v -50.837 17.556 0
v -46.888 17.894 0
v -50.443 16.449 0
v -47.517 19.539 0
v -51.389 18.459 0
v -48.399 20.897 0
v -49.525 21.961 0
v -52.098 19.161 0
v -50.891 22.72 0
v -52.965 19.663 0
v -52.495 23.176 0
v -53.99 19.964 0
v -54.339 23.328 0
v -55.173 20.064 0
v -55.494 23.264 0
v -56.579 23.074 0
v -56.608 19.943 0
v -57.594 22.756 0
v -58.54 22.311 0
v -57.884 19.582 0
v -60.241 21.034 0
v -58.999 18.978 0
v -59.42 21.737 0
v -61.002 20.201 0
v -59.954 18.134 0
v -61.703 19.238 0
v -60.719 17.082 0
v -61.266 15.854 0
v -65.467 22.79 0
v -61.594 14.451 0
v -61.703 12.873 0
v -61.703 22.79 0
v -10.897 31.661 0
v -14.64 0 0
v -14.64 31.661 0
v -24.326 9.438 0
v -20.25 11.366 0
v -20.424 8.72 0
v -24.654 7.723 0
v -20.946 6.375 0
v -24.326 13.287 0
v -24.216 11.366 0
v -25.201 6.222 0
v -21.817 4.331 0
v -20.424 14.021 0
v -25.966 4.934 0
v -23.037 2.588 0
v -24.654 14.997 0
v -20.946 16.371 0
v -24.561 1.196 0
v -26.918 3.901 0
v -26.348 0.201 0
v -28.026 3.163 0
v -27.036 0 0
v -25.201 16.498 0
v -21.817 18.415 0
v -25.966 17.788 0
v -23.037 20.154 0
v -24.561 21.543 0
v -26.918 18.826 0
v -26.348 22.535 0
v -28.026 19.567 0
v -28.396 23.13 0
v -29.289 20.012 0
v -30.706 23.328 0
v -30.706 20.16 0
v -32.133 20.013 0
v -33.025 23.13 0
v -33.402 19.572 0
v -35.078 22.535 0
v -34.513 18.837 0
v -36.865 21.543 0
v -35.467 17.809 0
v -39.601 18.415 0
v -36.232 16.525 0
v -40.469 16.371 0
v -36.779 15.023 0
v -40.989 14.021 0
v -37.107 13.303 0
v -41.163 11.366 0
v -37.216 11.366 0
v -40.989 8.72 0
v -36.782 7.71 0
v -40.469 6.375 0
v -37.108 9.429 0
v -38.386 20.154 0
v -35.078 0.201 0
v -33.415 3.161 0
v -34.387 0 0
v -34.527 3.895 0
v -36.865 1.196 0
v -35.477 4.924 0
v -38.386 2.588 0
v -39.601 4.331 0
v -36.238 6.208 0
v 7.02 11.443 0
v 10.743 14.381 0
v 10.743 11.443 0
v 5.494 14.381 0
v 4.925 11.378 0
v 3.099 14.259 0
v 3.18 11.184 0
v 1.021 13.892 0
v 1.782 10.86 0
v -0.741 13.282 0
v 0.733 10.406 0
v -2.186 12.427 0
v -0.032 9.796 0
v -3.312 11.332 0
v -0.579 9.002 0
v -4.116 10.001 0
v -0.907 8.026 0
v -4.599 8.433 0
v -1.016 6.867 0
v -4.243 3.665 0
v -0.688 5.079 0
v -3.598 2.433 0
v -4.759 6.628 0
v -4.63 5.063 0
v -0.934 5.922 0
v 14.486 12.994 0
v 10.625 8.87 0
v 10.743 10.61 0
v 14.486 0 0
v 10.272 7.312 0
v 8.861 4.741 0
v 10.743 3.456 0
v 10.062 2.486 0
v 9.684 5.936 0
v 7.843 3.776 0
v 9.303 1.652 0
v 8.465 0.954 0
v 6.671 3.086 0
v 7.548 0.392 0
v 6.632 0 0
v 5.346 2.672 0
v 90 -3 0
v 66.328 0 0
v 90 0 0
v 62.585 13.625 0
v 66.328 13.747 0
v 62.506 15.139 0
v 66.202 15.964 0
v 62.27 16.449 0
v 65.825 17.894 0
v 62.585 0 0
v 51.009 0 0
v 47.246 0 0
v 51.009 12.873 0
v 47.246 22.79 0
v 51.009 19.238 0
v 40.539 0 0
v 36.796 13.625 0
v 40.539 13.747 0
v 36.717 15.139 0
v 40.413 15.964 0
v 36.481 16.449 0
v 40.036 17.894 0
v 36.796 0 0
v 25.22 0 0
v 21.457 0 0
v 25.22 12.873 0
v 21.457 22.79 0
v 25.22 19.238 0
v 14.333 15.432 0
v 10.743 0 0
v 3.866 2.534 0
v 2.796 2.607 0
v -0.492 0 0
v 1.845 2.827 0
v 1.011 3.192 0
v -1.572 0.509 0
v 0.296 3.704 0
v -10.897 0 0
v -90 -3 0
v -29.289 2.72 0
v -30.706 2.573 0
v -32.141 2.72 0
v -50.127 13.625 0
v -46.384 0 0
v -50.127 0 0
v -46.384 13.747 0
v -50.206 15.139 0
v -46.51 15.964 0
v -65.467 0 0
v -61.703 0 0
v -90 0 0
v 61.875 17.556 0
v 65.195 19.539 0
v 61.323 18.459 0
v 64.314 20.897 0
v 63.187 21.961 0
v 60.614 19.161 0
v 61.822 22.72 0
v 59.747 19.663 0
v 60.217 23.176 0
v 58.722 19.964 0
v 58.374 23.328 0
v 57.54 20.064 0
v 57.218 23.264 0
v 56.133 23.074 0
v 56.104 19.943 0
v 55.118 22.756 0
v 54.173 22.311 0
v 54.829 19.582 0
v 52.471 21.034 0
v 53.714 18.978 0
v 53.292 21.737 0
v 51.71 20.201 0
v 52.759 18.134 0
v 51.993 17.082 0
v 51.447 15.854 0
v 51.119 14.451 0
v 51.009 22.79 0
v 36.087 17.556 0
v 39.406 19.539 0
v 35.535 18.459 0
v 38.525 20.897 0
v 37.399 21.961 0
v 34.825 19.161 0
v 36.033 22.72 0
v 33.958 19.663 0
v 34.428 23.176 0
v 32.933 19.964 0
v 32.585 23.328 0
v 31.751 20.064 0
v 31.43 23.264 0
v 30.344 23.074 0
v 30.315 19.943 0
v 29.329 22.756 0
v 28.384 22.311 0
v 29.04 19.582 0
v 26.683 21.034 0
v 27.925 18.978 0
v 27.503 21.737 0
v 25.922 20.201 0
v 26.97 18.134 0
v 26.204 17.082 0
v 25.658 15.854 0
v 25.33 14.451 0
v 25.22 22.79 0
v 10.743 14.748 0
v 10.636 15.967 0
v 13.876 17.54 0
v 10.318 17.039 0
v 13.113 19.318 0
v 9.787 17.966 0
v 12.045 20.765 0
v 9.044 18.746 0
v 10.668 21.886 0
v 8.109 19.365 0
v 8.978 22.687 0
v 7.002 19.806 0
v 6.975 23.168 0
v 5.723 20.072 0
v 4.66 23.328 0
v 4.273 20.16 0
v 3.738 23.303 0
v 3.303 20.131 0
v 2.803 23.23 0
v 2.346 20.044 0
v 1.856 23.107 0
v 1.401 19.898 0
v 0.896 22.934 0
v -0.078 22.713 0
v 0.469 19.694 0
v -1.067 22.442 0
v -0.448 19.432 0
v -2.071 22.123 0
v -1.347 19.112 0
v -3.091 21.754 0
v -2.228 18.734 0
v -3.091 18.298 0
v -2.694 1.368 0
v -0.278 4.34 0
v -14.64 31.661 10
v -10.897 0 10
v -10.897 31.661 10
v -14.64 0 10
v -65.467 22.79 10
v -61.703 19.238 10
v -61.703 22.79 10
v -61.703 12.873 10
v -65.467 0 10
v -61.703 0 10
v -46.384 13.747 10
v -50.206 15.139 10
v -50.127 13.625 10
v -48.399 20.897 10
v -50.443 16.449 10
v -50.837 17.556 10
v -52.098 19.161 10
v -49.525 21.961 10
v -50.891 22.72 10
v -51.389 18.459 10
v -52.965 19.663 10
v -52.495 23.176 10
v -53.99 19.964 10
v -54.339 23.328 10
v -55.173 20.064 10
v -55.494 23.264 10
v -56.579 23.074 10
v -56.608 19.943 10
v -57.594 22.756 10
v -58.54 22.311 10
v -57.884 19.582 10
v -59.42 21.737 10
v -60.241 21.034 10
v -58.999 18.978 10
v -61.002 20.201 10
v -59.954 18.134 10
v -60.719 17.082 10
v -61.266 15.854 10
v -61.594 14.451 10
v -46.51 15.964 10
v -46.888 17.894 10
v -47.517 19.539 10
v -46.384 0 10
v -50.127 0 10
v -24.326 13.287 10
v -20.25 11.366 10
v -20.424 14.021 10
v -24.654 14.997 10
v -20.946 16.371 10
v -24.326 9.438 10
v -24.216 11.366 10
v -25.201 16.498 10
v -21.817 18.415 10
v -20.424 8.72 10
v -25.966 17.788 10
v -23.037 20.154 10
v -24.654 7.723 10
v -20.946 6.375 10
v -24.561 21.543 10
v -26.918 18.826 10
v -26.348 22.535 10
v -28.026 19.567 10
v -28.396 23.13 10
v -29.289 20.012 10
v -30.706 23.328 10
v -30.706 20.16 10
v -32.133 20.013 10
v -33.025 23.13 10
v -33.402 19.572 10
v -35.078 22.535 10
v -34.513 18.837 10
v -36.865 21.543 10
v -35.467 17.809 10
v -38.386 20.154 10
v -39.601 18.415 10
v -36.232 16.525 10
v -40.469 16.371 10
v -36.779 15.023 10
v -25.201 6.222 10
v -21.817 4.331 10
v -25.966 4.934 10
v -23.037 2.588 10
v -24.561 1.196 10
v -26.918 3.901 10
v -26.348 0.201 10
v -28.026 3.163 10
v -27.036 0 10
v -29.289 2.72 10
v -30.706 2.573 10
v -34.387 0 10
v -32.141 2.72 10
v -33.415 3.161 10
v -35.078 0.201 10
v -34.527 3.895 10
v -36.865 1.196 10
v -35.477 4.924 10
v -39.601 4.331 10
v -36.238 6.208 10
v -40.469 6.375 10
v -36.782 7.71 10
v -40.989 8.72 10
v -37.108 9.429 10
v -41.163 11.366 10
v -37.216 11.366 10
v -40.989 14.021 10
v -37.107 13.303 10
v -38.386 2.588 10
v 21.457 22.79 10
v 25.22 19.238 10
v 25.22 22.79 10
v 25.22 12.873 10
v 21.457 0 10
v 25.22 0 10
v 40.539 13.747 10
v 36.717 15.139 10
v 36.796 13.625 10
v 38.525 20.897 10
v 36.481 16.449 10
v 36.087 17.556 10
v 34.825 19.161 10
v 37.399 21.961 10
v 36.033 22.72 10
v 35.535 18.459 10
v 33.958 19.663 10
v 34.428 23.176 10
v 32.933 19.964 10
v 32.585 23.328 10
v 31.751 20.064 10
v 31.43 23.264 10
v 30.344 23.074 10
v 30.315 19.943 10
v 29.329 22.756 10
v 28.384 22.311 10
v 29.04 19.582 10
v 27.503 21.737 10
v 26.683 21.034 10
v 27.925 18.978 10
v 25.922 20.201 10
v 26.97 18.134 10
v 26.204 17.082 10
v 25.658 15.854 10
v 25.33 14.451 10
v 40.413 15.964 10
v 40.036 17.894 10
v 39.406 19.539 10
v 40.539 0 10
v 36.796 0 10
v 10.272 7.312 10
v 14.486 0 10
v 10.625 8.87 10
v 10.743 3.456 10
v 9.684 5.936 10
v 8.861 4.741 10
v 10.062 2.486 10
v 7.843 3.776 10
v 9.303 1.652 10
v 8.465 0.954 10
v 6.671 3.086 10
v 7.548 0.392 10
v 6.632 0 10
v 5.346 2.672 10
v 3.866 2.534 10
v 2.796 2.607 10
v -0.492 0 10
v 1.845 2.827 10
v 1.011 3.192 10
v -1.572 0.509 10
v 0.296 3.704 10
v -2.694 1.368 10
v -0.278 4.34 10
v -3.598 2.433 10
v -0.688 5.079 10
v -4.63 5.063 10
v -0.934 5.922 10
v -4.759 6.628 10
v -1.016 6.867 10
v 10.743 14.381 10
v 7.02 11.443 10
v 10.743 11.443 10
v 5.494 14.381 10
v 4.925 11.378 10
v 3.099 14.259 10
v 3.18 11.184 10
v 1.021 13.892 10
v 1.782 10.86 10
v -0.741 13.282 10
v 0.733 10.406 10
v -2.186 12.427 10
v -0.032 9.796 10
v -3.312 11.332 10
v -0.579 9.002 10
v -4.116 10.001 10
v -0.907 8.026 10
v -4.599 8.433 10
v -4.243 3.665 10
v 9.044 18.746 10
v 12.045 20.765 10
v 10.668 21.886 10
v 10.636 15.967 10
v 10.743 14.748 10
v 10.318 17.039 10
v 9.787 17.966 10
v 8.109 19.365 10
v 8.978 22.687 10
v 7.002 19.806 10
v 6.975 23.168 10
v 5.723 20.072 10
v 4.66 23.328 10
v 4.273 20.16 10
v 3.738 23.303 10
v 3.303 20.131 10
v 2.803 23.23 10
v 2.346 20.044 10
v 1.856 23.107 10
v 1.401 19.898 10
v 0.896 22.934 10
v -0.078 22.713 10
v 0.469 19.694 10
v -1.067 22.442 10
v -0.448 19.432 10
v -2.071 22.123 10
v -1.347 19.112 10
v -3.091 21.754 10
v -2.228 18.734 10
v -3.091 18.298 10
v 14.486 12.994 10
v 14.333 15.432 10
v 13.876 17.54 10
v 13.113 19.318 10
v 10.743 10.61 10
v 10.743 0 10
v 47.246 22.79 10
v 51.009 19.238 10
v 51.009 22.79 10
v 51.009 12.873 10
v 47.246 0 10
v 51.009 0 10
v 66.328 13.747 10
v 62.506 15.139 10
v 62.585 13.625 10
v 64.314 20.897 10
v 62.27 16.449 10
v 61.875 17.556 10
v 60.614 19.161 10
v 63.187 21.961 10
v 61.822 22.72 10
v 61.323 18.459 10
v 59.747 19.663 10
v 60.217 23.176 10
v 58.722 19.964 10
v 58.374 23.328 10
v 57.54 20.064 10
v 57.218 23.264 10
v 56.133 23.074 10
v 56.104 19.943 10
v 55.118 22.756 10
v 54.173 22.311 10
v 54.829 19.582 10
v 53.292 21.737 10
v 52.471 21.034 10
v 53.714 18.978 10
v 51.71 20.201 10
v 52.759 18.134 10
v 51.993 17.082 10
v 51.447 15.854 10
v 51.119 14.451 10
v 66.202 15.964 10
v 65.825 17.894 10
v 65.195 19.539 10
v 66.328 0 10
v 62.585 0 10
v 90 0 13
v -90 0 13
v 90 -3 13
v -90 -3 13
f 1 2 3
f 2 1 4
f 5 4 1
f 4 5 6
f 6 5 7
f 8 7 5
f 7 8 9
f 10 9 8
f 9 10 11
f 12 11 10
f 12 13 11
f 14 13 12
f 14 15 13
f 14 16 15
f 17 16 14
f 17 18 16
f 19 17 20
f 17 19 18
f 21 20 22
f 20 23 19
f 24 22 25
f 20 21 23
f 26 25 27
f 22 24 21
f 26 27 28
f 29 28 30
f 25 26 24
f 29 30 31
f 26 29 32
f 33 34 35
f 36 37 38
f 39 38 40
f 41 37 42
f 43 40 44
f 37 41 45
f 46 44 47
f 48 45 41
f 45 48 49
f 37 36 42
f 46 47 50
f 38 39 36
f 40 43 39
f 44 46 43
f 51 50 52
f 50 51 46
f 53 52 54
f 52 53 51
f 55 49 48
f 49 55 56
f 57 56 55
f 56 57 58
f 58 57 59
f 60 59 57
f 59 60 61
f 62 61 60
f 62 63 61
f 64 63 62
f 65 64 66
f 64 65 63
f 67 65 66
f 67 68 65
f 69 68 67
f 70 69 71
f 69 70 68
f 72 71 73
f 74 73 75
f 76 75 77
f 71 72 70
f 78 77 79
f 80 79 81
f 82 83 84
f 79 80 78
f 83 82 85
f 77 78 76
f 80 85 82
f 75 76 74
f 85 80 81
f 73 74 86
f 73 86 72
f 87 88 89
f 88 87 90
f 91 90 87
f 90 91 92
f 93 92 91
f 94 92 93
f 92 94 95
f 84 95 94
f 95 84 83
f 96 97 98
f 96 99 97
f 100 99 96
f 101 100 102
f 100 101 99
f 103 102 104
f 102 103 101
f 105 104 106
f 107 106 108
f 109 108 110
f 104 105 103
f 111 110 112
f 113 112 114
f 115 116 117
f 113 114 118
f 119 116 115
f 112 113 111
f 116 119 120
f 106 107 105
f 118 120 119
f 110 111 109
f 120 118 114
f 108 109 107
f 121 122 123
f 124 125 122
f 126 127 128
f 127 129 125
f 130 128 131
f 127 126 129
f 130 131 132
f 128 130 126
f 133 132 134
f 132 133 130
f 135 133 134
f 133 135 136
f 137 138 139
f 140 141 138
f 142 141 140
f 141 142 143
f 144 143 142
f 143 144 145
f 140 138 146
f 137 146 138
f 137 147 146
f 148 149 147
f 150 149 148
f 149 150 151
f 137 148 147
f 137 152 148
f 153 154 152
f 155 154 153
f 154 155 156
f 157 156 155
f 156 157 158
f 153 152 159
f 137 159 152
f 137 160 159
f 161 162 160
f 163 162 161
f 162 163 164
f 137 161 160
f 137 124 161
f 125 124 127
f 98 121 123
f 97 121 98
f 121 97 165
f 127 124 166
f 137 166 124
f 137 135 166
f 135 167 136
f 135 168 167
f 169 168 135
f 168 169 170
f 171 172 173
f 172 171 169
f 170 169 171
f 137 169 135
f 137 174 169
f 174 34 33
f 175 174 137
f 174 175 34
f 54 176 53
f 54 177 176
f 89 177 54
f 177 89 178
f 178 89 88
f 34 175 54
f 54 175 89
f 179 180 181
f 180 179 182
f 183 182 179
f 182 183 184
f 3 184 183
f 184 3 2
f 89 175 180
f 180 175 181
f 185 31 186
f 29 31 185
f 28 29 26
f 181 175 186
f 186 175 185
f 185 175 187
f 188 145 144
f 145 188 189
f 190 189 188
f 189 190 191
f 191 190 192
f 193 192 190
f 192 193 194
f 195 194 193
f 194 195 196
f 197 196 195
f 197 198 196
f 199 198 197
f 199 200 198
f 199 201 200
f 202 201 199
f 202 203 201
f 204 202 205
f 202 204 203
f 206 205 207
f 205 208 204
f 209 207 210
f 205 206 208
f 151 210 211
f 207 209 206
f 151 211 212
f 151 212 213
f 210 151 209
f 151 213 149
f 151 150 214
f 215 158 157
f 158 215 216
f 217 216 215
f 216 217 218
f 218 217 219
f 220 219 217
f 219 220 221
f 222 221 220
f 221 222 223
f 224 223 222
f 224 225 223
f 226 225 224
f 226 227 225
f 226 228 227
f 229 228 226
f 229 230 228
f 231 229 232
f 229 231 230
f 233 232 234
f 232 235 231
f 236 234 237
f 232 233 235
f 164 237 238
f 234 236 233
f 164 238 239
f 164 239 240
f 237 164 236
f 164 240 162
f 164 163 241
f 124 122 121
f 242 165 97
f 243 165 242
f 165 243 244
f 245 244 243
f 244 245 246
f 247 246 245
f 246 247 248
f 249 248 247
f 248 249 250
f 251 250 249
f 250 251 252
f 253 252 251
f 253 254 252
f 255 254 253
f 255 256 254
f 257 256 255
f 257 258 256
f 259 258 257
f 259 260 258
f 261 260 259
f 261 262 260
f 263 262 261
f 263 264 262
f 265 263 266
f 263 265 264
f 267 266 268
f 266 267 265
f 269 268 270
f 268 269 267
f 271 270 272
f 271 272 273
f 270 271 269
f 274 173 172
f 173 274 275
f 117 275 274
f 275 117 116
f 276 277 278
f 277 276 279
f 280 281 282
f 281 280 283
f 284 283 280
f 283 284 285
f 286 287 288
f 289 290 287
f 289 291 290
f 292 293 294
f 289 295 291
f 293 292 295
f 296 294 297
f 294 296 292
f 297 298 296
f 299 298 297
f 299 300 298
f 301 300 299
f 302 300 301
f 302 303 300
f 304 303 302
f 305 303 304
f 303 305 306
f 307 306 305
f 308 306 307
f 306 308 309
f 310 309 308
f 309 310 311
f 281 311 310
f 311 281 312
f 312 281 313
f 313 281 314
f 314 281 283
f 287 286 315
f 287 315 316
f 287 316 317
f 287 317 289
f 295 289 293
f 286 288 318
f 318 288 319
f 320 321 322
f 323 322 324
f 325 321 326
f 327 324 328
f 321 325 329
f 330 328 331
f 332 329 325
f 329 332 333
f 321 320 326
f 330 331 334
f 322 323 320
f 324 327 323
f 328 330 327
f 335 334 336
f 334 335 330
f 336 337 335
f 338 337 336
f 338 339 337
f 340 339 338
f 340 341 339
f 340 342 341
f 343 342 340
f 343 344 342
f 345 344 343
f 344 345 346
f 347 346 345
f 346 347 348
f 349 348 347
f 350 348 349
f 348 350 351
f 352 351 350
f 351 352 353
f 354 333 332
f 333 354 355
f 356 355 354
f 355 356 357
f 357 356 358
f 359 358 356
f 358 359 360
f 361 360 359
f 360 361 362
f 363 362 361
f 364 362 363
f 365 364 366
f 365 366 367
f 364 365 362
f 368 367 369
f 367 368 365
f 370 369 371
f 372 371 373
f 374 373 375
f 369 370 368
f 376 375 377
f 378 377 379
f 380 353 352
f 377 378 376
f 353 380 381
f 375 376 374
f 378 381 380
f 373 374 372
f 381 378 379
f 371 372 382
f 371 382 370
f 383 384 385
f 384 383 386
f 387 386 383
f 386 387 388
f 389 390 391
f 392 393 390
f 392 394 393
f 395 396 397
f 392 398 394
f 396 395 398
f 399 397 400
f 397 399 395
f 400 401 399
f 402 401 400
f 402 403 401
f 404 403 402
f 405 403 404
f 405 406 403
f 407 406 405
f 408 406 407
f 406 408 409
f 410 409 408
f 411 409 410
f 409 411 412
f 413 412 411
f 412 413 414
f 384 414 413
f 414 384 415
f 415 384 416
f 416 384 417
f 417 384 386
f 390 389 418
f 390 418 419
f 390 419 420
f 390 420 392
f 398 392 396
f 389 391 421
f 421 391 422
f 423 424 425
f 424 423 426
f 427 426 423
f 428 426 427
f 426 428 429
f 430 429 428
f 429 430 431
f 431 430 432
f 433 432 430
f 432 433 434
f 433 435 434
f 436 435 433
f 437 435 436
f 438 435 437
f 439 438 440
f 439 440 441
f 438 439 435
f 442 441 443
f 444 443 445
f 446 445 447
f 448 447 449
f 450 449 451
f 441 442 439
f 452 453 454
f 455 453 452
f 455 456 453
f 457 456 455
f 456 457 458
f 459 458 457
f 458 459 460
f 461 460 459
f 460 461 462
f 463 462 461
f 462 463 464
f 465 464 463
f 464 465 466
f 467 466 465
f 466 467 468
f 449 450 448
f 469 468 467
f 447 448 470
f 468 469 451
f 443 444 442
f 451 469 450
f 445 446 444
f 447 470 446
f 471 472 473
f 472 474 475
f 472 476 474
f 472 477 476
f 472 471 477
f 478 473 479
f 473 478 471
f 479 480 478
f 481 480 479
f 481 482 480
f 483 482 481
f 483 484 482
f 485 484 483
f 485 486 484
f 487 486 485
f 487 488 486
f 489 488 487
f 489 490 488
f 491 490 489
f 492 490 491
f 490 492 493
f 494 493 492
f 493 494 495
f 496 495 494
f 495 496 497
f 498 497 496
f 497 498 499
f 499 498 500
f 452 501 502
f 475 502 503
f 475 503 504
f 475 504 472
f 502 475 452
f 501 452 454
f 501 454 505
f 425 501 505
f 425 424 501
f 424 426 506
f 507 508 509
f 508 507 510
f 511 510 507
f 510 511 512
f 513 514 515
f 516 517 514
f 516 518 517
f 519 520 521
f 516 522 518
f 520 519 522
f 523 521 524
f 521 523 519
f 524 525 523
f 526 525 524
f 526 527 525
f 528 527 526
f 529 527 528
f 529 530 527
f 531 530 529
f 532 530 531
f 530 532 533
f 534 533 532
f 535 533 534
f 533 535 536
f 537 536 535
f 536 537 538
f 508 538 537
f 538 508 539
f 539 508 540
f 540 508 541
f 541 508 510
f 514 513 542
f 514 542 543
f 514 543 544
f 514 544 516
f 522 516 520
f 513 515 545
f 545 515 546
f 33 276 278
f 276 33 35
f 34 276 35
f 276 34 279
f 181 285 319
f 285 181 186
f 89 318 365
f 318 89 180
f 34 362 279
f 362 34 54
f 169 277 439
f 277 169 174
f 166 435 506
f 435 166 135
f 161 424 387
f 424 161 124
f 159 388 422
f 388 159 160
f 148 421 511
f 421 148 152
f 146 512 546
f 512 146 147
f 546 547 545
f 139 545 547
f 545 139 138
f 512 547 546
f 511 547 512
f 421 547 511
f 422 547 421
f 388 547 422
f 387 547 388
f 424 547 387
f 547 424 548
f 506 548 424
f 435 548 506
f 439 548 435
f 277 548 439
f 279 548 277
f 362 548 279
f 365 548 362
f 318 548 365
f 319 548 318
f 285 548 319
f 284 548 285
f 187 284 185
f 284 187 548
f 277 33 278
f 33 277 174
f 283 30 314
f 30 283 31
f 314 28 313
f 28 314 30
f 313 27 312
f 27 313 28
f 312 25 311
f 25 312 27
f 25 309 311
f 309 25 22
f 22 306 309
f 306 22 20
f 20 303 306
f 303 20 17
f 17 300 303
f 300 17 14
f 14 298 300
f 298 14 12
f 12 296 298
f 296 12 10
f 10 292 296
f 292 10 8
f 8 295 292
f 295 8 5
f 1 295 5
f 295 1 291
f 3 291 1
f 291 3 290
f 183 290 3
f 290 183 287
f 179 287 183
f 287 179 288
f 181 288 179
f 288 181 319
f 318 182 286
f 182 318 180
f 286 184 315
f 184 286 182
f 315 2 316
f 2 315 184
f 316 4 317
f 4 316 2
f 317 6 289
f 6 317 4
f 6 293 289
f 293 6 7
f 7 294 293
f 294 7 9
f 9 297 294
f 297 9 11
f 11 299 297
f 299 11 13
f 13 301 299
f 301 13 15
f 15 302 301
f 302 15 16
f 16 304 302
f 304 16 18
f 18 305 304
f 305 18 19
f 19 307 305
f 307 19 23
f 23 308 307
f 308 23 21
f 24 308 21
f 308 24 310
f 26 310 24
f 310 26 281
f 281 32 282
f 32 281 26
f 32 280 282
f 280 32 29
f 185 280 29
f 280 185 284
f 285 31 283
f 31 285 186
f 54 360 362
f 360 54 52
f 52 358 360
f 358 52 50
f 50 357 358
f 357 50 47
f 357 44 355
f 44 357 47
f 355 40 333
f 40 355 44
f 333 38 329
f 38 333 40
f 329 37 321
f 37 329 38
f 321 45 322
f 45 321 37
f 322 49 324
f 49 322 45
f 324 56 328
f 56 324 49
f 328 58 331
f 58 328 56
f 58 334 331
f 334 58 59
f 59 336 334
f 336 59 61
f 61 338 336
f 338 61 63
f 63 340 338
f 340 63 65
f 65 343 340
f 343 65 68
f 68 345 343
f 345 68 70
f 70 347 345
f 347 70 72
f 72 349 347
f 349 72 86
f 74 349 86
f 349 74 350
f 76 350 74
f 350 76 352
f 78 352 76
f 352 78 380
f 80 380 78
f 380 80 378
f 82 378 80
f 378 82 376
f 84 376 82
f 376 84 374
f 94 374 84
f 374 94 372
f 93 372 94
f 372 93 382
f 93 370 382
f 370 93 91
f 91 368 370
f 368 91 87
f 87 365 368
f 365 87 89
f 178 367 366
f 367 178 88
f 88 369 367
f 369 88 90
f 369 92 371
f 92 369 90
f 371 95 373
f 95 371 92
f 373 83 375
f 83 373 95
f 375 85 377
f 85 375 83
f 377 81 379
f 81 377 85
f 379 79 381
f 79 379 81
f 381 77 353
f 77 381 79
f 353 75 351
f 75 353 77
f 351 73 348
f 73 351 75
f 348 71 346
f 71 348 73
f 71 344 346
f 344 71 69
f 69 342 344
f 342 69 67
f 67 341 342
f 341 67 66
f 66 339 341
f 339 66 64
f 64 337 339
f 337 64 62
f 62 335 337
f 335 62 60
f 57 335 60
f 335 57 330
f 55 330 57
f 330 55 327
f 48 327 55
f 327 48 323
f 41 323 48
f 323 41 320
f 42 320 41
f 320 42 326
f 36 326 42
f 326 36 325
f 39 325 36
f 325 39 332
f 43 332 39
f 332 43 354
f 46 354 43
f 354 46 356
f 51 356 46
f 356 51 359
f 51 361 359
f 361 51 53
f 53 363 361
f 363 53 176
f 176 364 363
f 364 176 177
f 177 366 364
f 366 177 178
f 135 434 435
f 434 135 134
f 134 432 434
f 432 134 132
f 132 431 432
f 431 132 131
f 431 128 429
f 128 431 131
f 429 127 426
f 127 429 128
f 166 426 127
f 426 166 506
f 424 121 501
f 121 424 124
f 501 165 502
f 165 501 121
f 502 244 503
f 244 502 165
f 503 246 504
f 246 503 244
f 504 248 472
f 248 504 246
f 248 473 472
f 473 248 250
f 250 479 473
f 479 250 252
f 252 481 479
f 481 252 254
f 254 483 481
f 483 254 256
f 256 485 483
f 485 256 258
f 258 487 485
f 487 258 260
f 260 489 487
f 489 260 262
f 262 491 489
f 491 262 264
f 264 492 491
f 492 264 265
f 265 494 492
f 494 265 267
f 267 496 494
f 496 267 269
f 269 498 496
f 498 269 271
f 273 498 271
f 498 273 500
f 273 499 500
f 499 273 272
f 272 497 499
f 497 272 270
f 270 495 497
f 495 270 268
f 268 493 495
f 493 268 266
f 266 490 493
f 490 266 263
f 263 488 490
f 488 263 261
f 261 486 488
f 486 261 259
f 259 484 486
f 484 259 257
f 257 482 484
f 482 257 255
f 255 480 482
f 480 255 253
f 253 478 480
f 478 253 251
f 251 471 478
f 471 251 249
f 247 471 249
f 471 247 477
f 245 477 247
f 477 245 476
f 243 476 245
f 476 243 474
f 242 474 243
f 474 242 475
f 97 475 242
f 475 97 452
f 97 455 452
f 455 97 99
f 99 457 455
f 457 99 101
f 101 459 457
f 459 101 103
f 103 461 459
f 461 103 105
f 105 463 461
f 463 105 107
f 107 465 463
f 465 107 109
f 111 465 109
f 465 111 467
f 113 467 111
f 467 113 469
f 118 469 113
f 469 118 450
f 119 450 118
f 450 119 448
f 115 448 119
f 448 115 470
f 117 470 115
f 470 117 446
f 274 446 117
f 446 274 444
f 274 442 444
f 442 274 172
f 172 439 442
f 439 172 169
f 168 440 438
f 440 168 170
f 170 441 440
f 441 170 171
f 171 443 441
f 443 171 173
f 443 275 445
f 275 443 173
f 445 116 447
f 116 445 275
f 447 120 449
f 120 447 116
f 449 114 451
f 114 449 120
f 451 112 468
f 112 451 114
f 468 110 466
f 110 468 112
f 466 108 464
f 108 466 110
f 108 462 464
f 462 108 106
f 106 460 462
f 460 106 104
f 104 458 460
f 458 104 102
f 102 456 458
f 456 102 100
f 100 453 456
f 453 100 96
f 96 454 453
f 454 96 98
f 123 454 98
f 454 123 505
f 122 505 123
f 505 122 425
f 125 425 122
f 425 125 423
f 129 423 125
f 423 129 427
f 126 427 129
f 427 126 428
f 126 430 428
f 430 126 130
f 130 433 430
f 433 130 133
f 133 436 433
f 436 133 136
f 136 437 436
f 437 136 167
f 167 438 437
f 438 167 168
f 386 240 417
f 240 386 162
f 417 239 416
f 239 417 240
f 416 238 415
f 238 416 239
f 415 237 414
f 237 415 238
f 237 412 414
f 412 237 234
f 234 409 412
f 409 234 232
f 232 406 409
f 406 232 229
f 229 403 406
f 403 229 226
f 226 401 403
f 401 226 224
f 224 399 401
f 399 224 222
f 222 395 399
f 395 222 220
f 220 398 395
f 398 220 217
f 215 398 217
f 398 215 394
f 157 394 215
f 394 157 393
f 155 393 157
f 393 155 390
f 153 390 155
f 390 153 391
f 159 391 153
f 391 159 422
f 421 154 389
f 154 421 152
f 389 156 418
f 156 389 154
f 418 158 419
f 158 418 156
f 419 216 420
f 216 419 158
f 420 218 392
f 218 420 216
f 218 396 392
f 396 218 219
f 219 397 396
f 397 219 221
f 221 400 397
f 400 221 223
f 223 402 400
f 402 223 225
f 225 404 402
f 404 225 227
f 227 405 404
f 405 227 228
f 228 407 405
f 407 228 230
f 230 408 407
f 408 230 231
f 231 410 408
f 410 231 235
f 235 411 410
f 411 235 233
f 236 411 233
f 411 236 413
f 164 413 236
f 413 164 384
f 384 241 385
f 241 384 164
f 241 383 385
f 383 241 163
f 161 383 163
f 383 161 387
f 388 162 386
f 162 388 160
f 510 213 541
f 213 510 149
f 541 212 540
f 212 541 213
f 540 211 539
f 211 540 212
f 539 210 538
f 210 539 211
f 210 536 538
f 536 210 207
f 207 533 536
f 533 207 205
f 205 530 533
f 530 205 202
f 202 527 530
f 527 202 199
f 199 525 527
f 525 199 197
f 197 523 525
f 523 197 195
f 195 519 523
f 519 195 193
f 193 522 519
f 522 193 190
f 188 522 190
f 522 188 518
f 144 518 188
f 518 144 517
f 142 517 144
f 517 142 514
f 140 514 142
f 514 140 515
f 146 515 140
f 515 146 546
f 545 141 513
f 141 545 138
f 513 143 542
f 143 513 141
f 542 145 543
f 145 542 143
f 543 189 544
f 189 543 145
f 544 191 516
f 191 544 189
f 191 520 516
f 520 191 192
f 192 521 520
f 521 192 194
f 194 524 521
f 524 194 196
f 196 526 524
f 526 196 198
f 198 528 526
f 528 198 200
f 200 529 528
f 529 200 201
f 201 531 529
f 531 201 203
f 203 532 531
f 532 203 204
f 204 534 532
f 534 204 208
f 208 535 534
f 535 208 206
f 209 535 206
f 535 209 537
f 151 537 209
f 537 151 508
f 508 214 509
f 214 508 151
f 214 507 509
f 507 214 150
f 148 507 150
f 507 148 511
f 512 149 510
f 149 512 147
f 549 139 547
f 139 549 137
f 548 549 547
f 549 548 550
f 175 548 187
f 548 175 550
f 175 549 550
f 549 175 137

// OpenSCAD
// file: Minecraft_Name.scad
module Minecraft_Name(text, font_size=30, extrude_height=10, extra_base=3, adjust_base_width=0, texture_width=1.6, texture_depth=0.4)
{
    nb_char = len(text);
    color("LimeGreen")
    
    union() {
        linear_extrude(height=extrude_height)
          text(text=text, size=font_size, font="Minecrafter", halign="center");
        translate([0, -extra_base/2, (extrude_height+extra_base)/2])
          cube(size=[nb_char*font_size+adjust_base_width, extra_base, extrude_height+extra_base], center=true);
    }
}
// main file
use <Minecraft_Name.scad>;

Minecraft_Name("nolann", font_size=30, extra_base=3, adjust_base_width=0, texture_depth=0);
